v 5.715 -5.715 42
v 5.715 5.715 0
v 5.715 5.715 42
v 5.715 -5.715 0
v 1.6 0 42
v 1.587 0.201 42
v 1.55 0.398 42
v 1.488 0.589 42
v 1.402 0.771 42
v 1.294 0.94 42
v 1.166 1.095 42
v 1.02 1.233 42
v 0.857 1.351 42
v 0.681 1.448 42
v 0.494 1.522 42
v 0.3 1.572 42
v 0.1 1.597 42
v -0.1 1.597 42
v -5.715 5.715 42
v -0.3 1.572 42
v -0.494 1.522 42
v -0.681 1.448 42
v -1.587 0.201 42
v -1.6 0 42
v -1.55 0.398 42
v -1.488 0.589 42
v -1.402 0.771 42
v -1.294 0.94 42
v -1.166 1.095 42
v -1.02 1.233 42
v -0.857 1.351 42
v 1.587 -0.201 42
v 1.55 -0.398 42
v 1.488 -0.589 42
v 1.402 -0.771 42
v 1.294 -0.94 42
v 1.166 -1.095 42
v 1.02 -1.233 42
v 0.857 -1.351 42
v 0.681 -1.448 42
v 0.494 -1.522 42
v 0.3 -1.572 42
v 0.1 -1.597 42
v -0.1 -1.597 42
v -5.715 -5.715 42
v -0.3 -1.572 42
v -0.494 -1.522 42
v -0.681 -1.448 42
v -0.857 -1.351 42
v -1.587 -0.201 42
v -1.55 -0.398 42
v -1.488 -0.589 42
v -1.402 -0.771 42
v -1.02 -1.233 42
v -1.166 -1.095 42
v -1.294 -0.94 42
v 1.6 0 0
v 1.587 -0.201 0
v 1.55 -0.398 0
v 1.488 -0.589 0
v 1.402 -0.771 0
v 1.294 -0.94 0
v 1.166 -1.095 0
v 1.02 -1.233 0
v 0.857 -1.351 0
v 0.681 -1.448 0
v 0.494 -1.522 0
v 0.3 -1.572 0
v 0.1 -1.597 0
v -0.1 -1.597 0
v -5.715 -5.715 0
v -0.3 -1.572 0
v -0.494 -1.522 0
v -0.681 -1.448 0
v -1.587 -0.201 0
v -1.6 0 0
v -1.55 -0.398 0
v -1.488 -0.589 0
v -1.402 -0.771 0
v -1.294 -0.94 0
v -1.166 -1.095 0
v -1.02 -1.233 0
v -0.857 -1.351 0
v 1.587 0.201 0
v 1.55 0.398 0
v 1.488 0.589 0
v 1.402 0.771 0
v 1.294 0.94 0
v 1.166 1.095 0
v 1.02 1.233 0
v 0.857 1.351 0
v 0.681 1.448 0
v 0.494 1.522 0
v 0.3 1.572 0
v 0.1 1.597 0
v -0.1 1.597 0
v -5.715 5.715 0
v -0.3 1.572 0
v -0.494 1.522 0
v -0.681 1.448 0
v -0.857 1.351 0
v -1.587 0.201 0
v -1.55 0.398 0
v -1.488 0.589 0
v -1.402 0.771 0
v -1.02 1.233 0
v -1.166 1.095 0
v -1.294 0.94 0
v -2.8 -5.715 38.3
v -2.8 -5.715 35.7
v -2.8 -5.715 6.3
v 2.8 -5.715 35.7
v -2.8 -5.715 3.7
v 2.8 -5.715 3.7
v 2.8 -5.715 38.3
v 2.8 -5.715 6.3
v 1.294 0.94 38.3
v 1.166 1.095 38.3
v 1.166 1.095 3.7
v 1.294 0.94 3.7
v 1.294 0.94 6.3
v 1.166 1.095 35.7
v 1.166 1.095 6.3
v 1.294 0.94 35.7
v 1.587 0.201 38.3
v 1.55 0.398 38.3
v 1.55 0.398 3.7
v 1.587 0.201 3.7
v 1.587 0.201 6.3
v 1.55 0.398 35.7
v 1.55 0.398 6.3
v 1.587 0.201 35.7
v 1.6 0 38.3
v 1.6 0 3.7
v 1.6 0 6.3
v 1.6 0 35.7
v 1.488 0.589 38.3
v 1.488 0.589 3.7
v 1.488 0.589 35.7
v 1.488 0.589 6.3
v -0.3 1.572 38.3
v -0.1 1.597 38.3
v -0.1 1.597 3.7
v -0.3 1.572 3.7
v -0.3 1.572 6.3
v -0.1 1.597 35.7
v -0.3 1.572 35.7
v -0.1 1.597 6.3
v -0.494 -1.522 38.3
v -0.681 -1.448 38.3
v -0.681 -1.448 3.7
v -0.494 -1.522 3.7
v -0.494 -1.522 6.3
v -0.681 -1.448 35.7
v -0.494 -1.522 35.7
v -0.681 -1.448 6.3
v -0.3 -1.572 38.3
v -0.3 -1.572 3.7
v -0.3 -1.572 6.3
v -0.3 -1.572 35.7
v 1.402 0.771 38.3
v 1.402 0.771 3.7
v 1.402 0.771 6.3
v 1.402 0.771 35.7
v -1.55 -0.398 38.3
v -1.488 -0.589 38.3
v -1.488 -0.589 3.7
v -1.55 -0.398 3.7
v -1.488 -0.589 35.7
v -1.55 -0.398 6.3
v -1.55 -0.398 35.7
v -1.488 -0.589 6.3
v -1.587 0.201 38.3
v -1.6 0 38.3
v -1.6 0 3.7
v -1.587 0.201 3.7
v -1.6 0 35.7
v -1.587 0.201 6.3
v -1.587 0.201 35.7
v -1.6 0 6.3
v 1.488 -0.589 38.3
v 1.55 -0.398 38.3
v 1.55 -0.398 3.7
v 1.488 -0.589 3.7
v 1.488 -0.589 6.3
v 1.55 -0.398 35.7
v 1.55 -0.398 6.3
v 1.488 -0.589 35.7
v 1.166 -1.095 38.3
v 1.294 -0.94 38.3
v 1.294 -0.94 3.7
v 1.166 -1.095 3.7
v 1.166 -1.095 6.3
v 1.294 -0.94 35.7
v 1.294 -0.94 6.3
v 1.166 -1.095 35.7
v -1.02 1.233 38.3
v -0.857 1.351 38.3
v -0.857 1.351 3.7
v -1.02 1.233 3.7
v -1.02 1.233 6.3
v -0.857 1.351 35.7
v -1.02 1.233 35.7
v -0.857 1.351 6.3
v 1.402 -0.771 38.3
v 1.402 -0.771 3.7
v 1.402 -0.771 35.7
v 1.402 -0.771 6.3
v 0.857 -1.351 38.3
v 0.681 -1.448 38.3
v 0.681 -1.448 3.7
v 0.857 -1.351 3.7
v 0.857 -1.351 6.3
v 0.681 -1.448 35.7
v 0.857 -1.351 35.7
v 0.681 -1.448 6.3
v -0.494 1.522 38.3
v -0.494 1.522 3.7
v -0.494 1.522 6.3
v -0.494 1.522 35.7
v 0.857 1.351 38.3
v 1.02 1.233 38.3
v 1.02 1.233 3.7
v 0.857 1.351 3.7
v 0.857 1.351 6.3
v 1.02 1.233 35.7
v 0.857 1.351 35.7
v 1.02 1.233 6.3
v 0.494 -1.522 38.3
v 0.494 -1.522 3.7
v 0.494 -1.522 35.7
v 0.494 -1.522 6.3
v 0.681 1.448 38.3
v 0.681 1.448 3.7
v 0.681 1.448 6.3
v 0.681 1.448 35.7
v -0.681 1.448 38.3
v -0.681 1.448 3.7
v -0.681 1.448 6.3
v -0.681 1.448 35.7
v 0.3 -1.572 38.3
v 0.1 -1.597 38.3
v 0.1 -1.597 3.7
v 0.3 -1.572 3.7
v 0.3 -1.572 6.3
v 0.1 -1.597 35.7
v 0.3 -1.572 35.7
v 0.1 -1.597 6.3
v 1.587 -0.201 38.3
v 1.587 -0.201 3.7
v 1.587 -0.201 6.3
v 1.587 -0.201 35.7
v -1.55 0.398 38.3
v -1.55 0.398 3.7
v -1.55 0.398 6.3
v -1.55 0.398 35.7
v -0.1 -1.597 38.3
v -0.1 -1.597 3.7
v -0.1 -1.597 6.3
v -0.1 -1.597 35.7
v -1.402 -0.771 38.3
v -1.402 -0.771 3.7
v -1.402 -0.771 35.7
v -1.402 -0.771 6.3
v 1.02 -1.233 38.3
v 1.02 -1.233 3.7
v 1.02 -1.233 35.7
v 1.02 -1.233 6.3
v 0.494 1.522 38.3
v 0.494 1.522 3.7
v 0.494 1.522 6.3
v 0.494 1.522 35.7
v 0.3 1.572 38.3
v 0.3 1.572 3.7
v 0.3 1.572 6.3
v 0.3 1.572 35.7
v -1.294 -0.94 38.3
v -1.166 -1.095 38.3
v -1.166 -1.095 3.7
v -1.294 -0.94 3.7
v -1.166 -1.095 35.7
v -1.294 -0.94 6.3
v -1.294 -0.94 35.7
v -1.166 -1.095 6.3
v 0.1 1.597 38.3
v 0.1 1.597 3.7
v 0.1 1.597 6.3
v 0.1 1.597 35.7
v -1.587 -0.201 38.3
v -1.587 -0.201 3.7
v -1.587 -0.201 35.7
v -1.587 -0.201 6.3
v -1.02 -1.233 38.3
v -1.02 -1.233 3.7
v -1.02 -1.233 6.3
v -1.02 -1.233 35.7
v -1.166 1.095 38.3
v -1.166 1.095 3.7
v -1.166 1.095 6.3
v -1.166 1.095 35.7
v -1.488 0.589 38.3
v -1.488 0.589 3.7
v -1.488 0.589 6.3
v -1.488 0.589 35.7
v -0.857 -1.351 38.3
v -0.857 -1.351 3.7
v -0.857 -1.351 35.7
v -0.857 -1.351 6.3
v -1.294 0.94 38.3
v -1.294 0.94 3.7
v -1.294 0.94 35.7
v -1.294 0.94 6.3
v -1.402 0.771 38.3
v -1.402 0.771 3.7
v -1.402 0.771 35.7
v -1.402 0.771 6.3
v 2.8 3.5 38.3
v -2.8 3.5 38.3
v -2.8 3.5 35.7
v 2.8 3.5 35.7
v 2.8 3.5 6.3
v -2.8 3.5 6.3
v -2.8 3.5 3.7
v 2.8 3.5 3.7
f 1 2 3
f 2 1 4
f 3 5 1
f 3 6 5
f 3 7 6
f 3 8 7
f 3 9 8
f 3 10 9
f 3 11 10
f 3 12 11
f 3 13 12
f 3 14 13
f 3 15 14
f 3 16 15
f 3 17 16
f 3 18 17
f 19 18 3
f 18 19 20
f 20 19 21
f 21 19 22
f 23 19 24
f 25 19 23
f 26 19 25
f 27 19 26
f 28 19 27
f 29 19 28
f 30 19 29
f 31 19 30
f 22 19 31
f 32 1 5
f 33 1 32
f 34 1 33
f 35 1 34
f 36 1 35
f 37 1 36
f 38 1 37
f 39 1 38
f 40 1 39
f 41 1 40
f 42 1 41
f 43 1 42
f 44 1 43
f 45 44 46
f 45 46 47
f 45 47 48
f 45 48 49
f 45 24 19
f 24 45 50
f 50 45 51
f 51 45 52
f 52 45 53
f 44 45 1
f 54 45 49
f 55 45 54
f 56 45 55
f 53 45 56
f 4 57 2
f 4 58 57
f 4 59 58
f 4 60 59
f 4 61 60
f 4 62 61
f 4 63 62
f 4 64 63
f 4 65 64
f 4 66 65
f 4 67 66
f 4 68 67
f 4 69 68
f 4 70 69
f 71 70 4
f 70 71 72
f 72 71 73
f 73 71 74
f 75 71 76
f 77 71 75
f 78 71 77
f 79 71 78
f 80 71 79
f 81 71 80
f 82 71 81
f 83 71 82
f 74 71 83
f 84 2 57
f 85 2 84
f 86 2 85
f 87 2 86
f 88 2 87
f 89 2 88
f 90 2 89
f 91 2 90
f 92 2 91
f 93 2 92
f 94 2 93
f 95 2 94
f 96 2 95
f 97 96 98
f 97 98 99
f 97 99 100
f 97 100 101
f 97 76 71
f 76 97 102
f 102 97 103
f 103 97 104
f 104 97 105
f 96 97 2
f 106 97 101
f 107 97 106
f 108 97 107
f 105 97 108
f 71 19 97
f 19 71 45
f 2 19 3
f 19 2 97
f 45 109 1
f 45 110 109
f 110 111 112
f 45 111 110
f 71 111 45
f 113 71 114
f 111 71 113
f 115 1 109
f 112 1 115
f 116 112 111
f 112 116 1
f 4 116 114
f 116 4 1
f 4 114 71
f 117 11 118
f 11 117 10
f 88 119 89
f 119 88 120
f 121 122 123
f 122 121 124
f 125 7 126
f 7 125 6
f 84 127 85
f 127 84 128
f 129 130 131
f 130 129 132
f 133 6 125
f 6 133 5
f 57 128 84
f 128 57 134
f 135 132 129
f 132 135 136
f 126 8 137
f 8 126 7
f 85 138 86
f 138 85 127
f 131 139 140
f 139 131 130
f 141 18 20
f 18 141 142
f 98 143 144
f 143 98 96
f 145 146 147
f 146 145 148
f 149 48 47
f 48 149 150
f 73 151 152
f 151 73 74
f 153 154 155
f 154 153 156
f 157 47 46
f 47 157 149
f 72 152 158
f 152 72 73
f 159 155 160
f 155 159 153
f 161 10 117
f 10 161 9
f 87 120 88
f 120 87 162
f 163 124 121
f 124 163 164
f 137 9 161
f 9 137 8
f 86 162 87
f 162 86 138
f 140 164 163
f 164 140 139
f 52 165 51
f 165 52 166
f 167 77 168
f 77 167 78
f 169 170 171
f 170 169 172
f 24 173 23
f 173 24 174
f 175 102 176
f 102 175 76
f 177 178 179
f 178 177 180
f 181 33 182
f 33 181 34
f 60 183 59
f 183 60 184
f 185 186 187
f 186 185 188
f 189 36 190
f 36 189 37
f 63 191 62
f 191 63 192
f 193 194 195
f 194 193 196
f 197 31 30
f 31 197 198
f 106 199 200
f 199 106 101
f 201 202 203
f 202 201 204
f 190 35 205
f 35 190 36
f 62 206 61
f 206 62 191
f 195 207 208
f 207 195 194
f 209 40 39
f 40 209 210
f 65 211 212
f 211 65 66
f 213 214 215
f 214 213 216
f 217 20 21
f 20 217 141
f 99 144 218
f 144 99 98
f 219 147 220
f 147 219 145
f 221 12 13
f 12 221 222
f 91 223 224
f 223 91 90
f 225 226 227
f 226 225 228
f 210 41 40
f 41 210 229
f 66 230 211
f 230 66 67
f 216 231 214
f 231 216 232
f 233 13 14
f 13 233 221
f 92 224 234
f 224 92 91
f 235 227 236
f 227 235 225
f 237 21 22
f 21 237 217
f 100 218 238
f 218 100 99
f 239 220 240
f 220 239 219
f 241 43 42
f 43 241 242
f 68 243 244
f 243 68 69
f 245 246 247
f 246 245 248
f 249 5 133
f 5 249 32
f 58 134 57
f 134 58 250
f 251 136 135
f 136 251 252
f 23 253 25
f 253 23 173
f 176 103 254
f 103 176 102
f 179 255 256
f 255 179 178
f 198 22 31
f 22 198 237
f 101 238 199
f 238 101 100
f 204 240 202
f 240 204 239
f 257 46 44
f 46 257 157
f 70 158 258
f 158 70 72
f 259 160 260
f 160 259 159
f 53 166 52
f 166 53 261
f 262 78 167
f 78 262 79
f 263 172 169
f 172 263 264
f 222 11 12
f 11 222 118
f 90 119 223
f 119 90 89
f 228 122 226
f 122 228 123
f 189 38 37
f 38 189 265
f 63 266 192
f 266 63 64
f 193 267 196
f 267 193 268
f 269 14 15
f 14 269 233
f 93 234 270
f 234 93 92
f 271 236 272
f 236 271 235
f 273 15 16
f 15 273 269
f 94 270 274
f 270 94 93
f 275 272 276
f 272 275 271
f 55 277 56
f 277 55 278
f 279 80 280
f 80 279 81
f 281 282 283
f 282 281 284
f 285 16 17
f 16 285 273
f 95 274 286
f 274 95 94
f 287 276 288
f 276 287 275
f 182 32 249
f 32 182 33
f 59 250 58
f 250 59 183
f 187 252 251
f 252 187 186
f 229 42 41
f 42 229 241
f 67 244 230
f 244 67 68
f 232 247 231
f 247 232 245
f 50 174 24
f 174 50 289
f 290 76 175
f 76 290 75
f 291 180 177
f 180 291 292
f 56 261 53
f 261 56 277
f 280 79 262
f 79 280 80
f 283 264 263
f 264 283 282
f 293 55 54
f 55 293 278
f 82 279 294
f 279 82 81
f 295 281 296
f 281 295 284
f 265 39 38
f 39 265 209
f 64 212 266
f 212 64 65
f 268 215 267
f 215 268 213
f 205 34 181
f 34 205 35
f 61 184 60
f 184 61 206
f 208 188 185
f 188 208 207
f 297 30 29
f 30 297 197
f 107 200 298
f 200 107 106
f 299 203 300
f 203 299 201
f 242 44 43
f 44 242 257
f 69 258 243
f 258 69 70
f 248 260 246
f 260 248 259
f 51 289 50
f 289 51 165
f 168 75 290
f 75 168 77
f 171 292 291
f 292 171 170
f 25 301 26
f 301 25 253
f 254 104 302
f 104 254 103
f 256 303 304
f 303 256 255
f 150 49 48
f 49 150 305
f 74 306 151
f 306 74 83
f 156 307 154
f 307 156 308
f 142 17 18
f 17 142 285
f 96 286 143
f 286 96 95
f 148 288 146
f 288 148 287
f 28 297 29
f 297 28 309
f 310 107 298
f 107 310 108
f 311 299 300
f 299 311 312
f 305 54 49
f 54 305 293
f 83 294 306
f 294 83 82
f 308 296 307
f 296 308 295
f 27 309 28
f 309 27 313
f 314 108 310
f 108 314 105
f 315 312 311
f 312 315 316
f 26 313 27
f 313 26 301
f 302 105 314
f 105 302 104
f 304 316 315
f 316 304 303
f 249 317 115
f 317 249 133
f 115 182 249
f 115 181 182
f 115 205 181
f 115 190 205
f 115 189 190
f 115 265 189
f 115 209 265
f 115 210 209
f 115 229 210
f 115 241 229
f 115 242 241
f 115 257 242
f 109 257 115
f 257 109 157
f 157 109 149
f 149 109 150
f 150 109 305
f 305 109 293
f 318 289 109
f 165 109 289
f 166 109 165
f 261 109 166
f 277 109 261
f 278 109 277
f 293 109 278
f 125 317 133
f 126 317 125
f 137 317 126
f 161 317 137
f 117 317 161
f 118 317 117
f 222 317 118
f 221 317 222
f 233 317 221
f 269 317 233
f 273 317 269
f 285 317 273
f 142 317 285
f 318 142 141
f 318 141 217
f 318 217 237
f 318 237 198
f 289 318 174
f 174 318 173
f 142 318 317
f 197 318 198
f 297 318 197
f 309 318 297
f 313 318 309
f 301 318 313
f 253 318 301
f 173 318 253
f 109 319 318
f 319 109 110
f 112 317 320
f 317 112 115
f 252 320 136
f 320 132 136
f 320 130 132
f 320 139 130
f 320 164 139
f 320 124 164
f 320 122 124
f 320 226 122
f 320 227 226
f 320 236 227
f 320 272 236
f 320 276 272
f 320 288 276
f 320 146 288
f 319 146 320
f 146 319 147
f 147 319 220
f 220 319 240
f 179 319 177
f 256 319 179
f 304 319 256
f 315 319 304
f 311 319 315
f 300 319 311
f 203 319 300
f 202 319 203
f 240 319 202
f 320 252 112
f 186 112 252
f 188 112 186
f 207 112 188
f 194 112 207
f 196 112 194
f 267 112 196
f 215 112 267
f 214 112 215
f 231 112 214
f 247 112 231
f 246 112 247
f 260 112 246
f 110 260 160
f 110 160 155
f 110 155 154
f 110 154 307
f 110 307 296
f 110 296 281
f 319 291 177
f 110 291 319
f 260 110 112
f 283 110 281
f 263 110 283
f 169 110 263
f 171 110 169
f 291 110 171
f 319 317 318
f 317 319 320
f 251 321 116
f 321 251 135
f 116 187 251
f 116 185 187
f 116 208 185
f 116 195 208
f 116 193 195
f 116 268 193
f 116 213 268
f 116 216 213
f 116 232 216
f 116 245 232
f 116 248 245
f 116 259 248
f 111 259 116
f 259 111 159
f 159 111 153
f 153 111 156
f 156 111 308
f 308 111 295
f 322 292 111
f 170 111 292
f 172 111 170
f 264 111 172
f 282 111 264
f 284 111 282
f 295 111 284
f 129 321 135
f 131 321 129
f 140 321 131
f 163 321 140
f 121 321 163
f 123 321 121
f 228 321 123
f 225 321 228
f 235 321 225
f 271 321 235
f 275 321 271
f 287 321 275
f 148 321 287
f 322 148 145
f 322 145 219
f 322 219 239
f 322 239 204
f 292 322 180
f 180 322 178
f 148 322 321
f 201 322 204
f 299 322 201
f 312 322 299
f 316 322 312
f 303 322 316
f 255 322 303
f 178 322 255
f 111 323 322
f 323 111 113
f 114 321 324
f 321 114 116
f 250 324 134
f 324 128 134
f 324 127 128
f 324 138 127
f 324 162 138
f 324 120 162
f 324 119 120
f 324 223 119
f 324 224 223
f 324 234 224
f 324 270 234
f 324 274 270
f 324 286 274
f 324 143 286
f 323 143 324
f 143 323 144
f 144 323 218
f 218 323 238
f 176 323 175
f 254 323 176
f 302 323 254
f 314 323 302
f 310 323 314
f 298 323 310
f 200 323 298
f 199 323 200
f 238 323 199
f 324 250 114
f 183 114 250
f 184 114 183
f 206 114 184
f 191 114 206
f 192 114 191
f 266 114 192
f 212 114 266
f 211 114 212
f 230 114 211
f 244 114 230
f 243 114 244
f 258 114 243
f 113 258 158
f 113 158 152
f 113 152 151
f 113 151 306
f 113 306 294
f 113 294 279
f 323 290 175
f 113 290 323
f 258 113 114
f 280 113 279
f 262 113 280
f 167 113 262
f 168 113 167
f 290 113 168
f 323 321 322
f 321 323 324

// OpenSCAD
// file: ../lib/nuts_and_screws.scad
//
// This file is part of the hexapod-robi distribution (https://github.com/schwicke/hexapod-robi).
// Copyright (c) 2021 Ulrich Schwickerath
//
// This program is free software: you can redistribute it and/or modify
// it under the terms of the GNU General Public License as published by
// the Free Software Foundation, version 3.
//
// This program is distributed in the hope that it will be useful, but
// WITHOUT ANY WARRANTY; without even the implied warranty of
// MERCHANTABILITY or FITNESS FOR A PARTICULAR PURPOSE. See the GNU
// General Public License for more details.
//
// You should have received a copy of the GNU General Public License
// along with this program. If not, see <http://www.gnu.org/licenses/>.
//
// This is a little plastic bit which is intended to get the holes for the connectors
// at the right position. It's not part of the robot itself, but useful for building it.
//
// m3s nuts dimensions
m3s_screwdim = 3; // m3 screws
m3s_delta = 0.2;
m3s_nut_width = 5.4+m3s_delta;
m3s_nut_hight = 2.4+m3s_delta;

module screwhole_mX_basic(d, height, fact){
     headlength = 0.6*d/2+0.1;
     translate([0, 0, headlength/2]){
          translate([0, 0, height/2])cylinder(h=height, r=d/2+0.1, center=true, $fn=50);
          cylinder(h=10*fact*headlength, r=d+0.1, center=true, $fn=50);
     }
}

module screwhole_mX(d, height, fact){
     headlength = 0.6*d/2+0.1;
     translate([0, 2, 0]){
          rotate([90, 0, 0]){
               translate([0, 0, headlength/2]){
                    translate([0, 0, height/2])cylinder(h=height, r=d/2+0.1, center=true, $fn=50);
                    cylinder(h=10*fact*headlength, r=d+0.1, center=true, $fn=50);
               }
          }
     }
}

module nuthole_mX(d){
     s = (d==2) ? 4: (d==2.5)? 5: (d==3) ? 5.5: 0.0;
     if (s==0){
          echo ("Nut size not supported");
     }
     e = s/sin(60.0);
     height = 40;
     headlength = 0.6*d/2+0.1;
     translate([0, 0, -5*headlength]){
          translate([0, 0, height/2])cylinder(h=height, r=d/2+0.1, center=true, $fn=50);
          cylinder(h=10*headlength, d=e+0.1, center=true, $fn=6);
     }
}

module my_screwhole_mX(d){
     translate([0, 0, thickness])rotate([180, 0, 0])screwhole_mX_basic(d, 40, 1);
}
// file: ../lib/globals.scad
//
// This file is part of the hexapod-robi distribution (https://github.com/schwicke/hexapod-robi).
// Copyright (c) 2021 Ulrich Schwickerath
//
// This program is free software: you can redistribute it and/or modify
// it under the terms of the GNU General Public License as published by
// the Free Software Foundation, version 3.
//
// This program is distributed in the hope that it will be useful, but
// WITHOUT ANY WARRANTY; without even the implied warranty of
// MERCHANTABILITY or FITNESS FOR A PARTICULAR PURPOSE. See the GNU
// General Public License for more details.
//
// You should have received a copy of the GNU General Public License
// along with this program. If not, see <http://www.gnu.org/licenses/>.
//
// This is a little plastic bit which is intended to get the holes for the connectors
// at the right position. It's not part of the robot itself, but useful for building it.
//
//
// all distances are in mm
//

// Define some globals used at various places
raster=2.54;

// motor height
space = 42.0;

// wall thickness
thickness = 4;

// battery box
batt_thickness = 3;
batt_x = 50;
batt_y = 160;
batt_z = 25;

// binder distance
binder_dist = 3.5;

// mount position base
base_mount_pos_x = batt_x/2+2*batt_thickness+1.5;

// dimensions for hubs for motor cabling
hub_hole_diameter = 2;
hub_spacer_height = 2;
hub_x = 4.9;
hub_y = 9.9;

module anchorbox(size){
     cube([40, 30, size],center=true);
}
// main file
//
// This file is part of the hexapod-robi distribution (https://github.com/schwicke/hexapod-robi).
// Copyright (c) 2021 Ulrich Schwickerath
//
// This program is free software: you can redistribute it and/or modify
// it under the terms of the GNU General Public License as published by
// the Free Software Foundation, version 3.
//
// This program is distributed in the hope that it will be useful, but
// WITHOUT ANY WARRANTY; without even the implied warranty of
// MERCHANTABILITY or FITNESS FOR A PARTICULAR PURPOSE. See the GNU
// General Public License for more details.
//
// You should have received a copy of the GNU General Public License
// along with this program. If not, see <http://www.gnu.org/licenses/>.
//
// This is a little plastic bit which is intended to get the holes for the connectors
// at the right position. It's not part of the robot itself, but useful for building it.
//

include <../lib/globals.scad>
include <../lib/nuts_and_screws.scad>

wx = 4*raster+raster/2;
wy = 4*raster+raster/2;
wyp = (wy-m3s_nut_width)/4.0;

module mount2(){
     difference(){
          translate([-wx/2, -wy/2, 0])cube([wx, wy, space]);
          // holes
          translate([0, 0, space+10])cylinder(h=50, r=m3s_screwdim/2+0.1, center=true, $fn=50);
          translate([0, 0, 10])cylinder(h=50, r=m3s_screwdim/2+0.1, center=true, $fn=50);
          // nuts 5.4mm x 2.4mm
          translate([0., 0.7, space-5])rotate([0,0,180])translate([-m3s_nut_width/2, -m3s_nut_width/2, -m3s_nut_hight/2])cube([m3s_nut_width, 4*m3s_nut_width, m3s_nut_hight], center=false);
          translate([0., 0.7, 5])rotate([0,0,180])translate([-m3s_nut_width/2, -m3s_nut_width/2, -m3s_nut_hight/2])cube([m3s_nut_width, 4*m3s_nut_width, m3s_nut_hight], center=false);

     }
}
mount2();
